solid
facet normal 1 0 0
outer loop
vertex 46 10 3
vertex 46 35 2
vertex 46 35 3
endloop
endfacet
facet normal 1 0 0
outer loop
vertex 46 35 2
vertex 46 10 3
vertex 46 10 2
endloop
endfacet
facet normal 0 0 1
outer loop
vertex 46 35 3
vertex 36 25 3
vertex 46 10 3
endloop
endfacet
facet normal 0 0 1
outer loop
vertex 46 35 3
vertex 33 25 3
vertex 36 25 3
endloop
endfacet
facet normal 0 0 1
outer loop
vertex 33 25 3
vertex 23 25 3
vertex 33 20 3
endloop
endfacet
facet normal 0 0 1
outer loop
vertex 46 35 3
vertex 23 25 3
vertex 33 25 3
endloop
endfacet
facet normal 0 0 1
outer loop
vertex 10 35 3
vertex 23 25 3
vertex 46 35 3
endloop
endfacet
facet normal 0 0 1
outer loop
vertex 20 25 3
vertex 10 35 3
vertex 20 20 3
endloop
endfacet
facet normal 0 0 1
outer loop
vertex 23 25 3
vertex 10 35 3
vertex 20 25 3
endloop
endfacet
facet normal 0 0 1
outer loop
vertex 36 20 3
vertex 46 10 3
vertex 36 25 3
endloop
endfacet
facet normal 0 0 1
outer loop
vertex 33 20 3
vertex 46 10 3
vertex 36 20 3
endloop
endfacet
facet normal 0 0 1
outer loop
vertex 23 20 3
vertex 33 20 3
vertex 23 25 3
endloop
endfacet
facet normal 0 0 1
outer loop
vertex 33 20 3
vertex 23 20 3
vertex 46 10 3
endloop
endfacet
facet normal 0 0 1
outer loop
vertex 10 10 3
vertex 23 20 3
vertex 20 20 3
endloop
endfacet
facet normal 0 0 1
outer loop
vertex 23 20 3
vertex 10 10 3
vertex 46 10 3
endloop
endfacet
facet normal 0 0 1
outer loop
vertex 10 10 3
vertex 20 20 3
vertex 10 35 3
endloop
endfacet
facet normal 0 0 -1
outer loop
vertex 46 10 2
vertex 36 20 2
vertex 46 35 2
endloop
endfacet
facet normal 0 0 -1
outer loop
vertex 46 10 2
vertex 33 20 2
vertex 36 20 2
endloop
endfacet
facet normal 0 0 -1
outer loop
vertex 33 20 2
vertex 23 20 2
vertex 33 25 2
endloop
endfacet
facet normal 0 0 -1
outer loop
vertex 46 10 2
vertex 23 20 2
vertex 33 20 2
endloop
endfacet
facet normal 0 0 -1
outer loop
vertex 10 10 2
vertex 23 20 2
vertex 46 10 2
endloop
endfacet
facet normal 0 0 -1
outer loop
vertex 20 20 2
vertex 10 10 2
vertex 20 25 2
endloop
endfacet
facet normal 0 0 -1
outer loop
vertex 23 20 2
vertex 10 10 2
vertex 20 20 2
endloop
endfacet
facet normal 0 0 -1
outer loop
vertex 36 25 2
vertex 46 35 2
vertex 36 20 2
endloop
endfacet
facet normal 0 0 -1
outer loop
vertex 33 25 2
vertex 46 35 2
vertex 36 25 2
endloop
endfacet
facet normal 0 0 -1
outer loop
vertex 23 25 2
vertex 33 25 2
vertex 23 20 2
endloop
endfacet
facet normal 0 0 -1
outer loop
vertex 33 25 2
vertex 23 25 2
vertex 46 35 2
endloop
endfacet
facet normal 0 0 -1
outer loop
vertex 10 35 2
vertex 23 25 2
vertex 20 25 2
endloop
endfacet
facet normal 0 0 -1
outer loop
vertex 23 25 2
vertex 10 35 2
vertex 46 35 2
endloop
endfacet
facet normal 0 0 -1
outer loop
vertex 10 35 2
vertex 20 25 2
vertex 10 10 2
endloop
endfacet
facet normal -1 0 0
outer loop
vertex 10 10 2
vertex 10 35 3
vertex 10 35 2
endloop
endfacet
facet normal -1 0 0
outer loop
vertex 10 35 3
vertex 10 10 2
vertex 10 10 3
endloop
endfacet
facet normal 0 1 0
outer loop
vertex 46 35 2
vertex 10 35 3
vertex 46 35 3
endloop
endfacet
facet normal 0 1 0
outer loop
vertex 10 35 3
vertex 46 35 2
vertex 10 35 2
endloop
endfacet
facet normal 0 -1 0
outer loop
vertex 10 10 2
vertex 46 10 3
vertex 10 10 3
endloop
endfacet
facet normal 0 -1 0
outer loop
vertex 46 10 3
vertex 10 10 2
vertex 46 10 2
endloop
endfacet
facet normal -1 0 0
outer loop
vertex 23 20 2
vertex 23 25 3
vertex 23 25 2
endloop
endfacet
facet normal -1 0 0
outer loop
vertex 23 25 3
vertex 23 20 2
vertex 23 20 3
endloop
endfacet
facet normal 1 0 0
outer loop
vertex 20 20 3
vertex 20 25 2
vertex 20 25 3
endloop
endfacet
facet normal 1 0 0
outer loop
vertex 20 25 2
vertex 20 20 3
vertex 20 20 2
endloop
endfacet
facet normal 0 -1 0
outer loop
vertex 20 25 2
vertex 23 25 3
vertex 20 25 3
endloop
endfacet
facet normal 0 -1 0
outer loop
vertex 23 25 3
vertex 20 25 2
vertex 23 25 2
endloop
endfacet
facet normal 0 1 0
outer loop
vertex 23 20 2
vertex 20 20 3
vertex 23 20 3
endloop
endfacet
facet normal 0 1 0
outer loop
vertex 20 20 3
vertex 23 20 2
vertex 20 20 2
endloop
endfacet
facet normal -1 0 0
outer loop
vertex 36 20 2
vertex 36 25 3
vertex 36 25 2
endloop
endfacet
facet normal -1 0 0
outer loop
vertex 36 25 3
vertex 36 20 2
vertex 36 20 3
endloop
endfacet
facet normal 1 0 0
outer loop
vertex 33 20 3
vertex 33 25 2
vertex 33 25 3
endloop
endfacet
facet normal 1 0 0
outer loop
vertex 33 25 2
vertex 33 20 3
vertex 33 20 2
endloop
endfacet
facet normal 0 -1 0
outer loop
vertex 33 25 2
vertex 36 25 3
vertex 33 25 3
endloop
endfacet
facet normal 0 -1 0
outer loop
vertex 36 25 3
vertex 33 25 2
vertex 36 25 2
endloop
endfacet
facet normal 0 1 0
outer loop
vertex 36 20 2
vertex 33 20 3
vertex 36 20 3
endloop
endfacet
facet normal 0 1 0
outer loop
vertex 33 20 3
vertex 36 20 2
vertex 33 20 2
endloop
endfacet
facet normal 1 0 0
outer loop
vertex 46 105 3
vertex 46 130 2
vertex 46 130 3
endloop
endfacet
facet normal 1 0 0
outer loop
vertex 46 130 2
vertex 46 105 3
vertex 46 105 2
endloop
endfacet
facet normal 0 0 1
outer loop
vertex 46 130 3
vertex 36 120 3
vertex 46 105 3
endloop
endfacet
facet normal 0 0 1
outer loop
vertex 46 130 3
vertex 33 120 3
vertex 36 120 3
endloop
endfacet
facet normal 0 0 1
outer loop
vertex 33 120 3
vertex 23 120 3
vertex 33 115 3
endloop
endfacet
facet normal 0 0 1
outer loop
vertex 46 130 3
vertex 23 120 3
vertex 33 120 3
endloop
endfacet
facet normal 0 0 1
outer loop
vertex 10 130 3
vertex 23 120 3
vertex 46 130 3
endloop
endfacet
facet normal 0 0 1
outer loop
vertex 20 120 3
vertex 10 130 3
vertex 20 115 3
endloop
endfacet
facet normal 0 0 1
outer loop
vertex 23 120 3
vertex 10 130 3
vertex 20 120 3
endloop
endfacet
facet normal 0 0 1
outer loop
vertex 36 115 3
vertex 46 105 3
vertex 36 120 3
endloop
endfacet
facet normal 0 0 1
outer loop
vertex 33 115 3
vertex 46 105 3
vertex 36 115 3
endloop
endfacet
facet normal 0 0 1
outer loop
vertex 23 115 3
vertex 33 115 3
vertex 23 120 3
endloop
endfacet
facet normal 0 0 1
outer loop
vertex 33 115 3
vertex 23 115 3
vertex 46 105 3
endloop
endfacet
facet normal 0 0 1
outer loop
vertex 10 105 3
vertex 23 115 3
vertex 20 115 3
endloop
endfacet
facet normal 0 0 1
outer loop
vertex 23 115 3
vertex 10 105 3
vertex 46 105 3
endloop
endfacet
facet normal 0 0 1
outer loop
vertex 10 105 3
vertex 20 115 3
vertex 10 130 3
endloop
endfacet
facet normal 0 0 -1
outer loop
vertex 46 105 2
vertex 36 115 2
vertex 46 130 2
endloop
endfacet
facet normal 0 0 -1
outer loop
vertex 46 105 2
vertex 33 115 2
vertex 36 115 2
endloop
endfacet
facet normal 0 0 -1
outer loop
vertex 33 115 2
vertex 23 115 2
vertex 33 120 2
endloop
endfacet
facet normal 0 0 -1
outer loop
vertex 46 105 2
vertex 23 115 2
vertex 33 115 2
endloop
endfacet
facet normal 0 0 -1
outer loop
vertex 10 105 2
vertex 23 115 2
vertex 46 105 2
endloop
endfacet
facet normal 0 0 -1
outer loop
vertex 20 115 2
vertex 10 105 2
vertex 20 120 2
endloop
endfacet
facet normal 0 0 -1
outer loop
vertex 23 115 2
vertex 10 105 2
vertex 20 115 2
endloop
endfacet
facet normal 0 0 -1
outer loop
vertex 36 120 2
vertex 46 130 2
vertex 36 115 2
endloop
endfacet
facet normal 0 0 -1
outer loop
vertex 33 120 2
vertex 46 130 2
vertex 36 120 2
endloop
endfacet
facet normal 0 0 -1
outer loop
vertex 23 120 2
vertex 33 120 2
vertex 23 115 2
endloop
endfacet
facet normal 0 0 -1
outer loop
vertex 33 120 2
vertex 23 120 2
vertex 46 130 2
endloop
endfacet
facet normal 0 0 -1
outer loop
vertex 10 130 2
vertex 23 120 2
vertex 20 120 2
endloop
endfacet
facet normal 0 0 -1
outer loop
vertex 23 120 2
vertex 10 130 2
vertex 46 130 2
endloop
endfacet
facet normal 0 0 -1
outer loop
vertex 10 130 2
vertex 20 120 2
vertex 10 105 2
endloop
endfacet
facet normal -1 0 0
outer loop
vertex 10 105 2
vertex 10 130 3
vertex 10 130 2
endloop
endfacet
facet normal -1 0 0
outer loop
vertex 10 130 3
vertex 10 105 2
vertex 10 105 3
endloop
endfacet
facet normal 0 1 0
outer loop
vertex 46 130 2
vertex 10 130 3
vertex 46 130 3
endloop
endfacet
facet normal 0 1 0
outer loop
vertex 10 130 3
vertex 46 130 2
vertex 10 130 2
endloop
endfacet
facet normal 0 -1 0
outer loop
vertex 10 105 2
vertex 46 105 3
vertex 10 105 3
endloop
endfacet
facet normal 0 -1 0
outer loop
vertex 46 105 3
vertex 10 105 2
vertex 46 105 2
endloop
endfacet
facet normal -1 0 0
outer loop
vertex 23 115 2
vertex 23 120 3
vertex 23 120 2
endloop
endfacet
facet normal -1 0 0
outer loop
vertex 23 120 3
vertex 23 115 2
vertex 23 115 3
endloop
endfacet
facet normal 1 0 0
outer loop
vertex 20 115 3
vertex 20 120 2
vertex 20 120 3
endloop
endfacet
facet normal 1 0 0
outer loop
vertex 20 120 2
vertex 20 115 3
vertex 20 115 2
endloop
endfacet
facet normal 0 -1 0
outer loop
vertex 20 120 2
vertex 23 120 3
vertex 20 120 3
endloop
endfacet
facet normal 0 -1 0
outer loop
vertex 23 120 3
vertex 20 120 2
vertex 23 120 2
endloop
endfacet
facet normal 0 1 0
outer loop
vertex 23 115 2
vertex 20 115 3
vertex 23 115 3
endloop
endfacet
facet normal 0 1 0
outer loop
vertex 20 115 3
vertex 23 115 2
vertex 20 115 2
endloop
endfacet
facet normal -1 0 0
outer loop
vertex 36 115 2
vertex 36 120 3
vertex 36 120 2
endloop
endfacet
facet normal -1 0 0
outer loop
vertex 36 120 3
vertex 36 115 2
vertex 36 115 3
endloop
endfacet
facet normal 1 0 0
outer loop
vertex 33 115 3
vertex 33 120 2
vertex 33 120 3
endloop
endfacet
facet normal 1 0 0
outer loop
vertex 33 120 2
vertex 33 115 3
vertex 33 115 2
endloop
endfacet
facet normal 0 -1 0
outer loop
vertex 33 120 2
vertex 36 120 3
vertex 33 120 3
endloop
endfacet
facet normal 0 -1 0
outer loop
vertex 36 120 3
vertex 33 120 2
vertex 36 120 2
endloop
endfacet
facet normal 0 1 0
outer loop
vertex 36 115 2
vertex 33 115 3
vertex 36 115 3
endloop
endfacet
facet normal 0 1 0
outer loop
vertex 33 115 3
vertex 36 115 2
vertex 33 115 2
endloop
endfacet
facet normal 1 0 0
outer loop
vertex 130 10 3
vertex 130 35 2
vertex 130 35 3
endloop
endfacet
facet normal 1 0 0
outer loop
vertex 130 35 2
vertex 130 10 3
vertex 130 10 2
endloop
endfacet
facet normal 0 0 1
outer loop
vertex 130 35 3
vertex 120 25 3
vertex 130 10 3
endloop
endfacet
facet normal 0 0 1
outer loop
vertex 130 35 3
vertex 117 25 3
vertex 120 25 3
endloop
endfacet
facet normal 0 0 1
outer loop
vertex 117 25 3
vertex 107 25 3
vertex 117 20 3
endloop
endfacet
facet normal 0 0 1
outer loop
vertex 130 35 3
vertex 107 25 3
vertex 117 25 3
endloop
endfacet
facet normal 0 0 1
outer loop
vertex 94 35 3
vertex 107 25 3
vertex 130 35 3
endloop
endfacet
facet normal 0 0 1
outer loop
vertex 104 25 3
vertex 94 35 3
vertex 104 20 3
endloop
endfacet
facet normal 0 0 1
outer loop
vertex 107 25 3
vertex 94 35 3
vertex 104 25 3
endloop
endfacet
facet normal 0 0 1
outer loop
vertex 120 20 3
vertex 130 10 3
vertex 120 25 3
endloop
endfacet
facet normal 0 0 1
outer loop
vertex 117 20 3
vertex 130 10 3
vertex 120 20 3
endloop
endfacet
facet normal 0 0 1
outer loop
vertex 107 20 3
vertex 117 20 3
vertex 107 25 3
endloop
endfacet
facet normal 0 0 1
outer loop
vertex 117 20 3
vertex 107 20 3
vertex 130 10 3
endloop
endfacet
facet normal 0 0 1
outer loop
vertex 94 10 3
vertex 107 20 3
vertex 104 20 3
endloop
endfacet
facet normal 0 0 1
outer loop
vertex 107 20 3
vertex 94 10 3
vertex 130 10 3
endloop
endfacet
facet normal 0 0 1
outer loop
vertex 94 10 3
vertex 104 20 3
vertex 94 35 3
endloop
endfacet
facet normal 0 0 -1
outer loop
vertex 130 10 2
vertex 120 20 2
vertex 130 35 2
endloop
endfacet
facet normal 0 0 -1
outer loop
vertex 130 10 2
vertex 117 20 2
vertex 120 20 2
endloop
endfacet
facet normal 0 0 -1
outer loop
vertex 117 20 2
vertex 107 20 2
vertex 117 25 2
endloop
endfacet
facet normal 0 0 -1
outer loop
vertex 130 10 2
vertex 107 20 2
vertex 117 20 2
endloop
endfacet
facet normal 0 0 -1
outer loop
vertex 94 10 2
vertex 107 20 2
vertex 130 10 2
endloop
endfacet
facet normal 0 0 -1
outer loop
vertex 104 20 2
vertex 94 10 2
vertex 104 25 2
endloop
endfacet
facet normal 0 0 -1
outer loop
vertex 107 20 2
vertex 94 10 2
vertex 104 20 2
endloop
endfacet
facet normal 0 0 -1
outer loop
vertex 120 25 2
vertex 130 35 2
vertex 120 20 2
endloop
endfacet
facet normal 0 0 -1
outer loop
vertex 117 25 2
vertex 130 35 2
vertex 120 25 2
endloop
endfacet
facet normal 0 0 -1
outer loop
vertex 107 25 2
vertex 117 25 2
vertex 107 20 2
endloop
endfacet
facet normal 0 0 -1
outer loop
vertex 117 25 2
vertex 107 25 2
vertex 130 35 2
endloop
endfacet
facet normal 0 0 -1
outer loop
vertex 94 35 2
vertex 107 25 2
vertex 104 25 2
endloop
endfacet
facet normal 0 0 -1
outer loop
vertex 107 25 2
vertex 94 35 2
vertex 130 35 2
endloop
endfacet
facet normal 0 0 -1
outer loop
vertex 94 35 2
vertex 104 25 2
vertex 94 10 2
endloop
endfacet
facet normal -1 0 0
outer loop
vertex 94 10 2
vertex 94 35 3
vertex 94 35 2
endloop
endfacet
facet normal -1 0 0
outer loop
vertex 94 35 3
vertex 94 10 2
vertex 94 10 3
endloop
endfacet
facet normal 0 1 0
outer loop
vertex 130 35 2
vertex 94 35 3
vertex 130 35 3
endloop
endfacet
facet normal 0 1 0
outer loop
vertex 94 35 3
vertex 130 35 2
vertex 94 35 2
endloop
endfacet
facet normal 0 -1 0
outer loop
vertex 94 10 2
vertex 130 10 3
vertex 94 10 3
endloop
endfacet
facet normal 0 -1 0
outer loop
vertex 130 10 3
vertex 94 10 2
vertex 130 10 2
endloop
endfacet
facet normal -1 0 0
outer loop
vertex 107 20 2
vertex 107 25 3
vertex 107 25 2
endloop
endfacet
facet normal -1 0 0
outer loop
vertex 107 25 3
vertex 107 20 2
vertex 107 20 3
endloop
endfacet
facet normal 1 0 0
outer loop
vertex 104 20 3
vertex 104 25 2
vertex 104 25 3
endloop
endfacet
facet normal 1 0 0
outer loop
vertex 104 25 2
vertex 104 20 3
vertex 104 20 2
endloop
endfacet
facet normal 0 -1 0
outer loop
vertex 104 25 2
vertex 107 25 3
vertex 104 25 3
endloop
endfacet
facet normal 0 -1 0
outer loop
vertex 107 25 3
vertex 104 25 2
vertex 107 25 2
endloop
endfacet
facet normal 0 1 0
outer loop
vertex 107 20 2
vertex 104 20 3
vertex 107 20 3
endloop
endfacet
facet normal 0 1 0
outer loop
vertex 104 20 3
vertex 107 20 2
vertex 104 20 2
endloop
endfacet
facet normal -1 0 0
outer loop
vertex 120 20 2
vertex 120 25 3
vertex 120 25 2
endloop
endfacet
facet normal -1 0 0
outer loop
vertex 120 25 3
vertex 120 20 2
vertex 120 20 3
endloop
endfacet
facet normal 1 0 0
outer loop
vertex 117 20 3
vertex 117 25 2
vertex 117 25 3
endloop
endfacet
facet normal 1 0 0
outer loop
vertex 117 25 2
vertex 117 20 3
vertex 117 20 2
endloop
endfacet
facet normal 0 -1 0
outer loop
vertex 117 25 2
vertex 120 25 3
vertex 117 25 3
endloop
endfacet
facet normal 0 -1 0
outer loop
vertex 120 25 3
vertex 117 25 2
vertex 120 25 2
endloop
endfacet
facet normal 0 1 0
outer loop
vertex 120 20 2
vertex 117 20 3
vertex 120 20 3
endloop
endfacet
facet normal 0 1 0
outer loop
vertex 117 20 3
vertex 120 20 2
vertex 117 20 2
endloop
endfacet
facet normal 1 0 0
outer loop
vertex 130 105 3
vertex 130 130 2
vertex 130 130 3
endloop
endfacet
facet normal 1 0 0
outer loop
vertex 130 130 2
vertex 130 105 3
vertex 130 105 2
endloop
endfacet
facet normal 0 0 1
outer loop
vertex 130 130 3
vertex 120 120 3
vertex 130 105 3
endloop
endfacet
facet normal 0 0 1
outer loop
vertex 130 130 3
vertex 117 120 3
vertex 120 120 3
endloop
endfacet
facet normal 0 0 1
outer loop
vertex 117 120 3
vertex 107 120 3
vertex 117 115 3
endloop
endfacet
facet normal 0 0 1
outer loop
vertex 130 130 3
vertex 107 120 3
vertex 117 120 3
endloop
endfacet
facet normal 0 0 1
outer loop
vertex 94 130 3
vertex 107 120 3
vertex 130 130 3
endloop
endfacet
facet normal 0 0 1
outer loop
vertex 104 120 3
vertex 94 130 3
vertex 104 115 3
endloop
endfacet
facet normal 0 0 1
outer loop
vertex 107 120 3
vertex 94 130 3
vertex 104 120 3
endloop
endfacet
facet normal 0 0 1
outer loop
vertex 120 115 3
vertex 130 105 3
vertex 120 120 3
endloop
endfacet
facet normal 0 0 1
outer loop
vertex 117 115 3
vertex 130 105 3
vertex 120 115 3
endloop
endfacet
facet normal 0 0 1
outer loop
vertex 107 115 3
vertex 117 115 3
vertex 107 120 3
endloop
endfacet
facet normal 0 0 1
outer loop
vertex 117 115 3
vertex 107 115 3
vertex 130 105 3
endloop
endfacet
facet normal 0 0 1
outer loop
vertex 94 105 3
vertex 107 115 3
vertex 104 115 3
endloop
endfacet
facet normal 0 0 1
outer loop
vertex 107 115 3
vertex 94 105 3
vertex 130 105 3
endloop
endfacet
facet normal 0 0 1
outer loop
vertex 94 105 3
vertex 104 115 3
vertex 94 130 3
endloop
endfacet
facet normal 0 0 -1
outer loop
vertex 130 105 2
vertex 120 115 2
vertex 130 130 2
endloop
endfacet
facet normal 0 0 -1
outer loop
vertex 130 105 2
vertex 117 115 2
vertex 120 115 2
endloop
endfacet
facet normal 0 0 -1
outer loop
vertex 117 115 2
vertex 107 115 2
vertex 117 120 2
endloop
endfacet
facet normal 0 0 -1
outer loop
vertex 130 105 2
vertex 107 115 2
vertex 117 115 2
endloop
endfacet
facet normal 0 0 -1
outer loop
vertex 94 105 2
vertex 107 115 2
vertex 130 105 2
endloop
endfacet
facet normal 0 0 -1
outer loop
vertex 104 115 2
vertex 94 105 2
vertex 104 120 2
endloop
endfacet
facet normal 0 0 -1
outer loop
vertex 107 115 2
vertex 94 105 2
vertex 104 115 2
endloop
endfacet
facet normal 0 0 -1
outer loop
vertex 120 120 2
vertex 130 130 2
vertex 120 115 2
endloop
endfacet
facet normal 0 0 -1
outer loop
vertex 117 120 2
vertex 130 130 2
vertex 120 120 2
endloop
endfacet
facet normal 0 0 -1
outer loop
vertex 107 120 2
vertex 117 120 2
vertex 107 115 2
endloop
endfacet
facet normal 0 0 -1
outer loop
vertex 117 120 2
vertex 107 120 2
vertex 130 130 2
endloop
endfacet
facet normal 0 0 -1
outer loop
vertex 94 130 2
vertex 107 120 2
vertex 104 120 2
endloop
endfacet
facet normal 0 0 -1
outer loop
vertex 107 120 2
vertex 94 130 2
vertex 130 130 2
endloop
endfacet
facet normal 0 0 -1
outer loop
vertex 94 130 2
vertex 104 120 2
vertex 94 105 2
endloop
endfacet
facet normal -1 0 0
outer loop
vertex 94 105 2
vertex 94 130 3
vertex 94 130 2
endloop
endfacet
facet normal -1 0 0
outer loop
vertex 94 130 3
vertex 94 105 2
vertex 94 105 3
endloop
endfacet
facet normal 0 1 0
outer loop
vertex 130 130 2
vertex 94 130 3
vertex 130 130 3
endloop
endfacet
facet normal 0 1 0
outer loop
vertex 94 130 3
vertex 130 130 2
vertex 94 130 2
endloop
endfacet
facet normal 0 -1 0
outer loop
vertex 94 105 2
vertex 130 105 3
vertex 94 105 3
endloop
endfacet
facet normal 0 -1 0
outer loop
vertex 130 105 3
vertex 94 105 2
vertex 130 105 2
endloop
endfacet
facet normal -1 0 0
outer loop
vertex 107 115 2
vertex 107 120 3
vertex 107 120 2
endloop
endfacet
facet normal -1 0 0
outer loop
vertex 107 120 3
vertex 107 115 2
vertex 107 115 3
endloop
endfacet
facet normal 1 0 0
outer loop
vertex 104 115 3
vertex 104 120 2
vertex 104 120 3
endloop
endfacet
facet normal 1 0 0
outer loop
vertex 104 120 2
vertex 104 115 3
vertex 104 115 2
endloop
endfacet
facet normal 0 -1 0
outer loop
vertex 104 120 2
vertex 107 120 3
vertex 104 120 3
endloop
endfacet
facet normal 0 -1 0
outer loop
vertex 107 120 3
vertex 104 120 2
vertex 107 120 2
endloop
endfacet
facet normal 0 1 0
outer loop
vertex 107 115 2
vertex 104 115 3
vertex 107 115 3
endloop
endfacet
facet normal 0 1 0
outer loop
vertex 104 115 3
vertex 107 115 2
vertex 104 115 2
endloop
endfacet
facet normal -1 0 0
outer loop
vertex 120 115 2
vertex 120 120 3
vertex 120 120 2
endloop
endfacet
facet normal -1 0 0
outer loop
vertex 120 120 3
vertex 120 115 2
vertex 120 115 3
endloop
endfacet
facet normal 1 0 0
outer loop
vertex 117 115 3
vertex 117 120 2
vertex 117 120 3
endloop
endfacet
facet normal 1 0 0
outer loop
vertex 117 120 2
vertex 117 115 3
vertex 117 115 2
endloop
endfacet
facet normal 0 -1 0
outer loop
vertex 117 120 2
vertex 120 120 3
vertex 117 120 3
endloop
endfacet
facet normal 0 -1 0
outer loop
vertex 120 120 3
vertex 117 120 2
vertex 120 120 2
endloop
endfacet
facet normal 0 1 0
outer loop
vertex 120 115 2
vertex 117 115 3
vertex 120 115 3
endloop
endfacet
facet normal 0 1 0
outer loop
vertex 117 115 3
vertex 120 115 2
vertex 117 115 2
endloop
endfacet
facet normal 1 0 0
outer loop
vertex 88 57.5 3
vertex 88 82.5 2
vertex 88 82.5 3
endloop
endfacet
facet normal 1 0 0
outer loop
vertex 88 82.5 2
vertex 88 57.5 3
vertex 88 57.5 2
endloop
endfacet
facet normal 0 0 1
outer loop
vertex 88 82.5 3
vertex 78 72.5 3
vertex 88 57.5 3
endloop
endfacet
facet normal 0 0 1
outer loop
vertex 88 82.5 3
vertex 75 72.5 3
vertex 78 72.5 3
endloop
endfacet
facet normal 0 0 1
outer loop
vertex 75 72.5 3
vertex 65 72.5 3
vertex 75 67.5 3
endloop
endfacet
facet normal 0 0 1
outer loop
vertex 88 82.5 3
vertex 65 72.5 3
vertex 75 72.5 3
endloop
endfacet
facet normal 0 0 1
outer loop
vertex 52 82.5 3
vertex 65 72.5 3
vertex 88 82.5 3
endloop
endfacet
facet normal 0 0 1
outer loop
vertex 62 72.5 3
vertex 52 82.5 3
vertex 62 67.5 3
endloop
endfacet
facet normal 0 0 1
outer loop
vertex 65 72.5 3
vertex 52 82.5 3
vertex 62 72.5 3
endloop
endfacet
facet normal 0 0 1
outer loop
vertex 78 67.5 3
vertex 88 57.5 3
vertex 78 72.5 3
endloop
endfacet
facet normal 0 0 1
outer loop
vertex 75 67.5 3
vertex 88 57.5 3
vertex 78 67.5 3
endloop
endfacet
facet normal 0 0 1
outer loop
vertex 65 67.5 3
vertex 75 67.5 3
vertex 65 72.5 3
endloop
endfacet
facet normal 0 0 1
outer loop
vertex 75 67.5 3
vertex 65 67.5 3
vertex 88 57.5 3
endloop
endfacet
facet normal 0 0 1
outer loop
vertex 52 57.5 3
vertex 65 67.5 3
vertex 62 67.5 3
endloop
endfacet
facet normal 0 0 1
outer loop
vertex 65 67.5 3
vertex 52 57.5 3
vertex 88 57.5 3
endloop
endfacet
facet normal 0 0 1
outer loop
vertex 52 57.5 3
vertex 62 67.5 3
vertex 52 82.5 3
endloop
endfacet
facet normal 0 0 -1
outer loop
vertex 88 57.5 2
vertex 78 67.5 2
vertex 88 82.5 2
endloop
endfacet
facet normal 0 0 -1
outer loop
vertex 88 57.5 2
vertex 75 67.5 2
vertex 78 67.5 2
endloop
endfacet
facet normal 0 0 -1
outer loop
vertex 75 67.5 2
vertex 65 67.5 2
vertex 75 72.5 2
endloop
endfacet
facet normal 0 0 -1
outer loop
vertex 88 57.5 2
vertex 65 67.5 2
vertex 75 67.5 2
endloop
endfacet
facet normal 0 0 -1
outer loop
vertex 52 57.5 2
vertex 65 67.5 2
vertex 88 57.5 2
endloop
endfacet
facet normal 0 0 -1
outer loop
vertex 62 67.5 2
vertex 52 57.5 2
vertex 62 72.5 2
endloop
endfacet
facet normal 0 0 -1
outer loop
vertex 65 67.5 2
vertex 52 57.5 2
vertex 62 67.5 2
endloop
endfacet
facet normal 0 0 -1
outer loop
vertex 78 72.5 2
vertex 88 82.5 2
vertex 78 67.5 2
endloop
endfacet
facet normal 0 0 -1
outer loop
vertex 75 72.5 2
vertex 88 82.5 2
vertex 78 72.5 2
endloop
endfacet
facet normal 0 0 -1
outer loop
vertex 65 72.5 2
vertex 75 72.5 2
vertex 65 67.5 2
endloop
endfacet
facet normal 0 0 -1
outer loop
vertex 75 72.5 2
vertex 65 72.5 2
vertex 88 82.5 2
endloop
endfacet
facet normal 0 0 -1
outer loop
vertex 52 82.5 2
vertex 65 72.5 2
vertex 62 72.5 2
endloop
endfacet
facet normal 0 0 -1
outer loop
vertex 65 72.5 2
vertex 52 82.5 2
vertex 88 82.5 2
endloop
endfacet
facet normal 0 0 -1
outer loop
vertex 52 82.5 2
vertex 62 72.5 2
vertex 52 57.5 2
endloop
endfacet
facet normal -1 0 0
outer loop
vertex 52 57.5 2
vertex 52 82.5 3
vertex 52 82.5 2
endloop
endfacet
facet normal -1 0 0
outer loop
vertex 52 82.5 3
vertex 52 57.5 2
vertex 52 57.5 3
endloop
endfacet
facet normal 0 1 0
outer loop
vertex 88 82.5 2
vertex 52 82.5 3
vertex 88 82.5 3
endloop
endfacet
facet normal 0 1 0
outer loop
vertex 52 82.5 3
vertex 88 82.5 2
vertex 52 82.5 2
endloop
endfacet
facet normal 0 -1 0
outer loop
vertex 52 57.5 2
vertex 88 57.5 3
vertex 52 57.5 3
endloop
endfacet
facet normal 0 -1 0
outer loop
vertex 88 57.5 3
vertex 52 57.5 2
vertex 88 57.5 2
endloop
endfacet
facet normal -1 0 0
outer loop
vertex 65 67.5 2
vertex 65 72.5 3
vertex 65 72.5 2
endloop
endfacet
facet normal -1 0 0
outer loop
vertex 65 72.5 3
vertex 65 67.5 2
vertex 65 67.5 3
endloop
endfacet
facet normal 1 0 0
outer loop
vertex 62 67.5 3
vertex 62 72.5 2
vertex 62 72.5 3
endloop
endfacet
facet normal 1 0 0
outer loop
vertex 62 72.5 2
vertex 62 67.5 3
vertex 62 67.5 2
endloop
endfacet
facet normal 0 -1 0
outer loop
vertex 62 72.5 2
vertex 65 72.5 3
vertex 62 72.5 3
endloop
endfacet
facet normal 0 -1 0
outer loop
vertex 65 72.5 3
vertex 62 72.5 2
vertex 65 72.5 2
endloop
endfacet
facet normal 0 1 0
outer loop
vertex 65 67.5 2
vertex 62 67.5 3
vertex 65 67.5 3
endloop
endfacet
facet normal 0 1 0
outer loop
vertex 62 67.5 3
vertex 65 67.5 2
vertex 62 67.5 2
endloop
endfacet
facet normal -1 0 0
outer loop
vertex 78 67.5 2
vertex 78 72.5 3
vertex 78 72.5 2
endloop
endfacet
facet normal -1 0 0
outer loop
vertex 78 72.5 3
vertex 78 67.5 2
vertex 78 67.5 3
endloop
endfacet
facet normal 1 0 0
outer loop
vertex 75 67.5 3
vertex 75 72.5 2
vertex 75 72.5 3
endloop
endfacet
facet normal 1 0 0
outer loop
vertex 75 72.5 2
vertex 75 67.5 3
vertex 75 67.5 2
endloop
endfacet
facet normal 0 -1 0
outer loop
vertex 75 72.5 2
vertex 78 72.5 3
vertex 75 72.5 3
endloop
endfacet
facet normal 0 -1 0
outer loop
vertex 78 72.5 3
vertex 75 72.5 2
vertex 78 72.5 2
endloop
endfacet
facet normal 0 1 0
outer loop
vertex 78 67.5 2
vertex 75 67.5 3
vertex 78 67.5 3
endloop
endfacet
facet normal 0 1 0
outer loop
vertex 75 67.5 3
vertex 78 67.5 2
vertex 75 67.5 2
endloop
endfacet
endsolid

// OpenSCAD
// file: dimensions.scad
$fn = 256;

textOnLid = "CAMERA";
textSize = 20;
length = 140;
width = 140;
height = 45;
thickness = 2;
withInset = true;
cornerRadius = 10;
// main file
include <dimensions.scad>

use <case.scad>

InsertPatches(length, width, cornerRadius, thickness);
